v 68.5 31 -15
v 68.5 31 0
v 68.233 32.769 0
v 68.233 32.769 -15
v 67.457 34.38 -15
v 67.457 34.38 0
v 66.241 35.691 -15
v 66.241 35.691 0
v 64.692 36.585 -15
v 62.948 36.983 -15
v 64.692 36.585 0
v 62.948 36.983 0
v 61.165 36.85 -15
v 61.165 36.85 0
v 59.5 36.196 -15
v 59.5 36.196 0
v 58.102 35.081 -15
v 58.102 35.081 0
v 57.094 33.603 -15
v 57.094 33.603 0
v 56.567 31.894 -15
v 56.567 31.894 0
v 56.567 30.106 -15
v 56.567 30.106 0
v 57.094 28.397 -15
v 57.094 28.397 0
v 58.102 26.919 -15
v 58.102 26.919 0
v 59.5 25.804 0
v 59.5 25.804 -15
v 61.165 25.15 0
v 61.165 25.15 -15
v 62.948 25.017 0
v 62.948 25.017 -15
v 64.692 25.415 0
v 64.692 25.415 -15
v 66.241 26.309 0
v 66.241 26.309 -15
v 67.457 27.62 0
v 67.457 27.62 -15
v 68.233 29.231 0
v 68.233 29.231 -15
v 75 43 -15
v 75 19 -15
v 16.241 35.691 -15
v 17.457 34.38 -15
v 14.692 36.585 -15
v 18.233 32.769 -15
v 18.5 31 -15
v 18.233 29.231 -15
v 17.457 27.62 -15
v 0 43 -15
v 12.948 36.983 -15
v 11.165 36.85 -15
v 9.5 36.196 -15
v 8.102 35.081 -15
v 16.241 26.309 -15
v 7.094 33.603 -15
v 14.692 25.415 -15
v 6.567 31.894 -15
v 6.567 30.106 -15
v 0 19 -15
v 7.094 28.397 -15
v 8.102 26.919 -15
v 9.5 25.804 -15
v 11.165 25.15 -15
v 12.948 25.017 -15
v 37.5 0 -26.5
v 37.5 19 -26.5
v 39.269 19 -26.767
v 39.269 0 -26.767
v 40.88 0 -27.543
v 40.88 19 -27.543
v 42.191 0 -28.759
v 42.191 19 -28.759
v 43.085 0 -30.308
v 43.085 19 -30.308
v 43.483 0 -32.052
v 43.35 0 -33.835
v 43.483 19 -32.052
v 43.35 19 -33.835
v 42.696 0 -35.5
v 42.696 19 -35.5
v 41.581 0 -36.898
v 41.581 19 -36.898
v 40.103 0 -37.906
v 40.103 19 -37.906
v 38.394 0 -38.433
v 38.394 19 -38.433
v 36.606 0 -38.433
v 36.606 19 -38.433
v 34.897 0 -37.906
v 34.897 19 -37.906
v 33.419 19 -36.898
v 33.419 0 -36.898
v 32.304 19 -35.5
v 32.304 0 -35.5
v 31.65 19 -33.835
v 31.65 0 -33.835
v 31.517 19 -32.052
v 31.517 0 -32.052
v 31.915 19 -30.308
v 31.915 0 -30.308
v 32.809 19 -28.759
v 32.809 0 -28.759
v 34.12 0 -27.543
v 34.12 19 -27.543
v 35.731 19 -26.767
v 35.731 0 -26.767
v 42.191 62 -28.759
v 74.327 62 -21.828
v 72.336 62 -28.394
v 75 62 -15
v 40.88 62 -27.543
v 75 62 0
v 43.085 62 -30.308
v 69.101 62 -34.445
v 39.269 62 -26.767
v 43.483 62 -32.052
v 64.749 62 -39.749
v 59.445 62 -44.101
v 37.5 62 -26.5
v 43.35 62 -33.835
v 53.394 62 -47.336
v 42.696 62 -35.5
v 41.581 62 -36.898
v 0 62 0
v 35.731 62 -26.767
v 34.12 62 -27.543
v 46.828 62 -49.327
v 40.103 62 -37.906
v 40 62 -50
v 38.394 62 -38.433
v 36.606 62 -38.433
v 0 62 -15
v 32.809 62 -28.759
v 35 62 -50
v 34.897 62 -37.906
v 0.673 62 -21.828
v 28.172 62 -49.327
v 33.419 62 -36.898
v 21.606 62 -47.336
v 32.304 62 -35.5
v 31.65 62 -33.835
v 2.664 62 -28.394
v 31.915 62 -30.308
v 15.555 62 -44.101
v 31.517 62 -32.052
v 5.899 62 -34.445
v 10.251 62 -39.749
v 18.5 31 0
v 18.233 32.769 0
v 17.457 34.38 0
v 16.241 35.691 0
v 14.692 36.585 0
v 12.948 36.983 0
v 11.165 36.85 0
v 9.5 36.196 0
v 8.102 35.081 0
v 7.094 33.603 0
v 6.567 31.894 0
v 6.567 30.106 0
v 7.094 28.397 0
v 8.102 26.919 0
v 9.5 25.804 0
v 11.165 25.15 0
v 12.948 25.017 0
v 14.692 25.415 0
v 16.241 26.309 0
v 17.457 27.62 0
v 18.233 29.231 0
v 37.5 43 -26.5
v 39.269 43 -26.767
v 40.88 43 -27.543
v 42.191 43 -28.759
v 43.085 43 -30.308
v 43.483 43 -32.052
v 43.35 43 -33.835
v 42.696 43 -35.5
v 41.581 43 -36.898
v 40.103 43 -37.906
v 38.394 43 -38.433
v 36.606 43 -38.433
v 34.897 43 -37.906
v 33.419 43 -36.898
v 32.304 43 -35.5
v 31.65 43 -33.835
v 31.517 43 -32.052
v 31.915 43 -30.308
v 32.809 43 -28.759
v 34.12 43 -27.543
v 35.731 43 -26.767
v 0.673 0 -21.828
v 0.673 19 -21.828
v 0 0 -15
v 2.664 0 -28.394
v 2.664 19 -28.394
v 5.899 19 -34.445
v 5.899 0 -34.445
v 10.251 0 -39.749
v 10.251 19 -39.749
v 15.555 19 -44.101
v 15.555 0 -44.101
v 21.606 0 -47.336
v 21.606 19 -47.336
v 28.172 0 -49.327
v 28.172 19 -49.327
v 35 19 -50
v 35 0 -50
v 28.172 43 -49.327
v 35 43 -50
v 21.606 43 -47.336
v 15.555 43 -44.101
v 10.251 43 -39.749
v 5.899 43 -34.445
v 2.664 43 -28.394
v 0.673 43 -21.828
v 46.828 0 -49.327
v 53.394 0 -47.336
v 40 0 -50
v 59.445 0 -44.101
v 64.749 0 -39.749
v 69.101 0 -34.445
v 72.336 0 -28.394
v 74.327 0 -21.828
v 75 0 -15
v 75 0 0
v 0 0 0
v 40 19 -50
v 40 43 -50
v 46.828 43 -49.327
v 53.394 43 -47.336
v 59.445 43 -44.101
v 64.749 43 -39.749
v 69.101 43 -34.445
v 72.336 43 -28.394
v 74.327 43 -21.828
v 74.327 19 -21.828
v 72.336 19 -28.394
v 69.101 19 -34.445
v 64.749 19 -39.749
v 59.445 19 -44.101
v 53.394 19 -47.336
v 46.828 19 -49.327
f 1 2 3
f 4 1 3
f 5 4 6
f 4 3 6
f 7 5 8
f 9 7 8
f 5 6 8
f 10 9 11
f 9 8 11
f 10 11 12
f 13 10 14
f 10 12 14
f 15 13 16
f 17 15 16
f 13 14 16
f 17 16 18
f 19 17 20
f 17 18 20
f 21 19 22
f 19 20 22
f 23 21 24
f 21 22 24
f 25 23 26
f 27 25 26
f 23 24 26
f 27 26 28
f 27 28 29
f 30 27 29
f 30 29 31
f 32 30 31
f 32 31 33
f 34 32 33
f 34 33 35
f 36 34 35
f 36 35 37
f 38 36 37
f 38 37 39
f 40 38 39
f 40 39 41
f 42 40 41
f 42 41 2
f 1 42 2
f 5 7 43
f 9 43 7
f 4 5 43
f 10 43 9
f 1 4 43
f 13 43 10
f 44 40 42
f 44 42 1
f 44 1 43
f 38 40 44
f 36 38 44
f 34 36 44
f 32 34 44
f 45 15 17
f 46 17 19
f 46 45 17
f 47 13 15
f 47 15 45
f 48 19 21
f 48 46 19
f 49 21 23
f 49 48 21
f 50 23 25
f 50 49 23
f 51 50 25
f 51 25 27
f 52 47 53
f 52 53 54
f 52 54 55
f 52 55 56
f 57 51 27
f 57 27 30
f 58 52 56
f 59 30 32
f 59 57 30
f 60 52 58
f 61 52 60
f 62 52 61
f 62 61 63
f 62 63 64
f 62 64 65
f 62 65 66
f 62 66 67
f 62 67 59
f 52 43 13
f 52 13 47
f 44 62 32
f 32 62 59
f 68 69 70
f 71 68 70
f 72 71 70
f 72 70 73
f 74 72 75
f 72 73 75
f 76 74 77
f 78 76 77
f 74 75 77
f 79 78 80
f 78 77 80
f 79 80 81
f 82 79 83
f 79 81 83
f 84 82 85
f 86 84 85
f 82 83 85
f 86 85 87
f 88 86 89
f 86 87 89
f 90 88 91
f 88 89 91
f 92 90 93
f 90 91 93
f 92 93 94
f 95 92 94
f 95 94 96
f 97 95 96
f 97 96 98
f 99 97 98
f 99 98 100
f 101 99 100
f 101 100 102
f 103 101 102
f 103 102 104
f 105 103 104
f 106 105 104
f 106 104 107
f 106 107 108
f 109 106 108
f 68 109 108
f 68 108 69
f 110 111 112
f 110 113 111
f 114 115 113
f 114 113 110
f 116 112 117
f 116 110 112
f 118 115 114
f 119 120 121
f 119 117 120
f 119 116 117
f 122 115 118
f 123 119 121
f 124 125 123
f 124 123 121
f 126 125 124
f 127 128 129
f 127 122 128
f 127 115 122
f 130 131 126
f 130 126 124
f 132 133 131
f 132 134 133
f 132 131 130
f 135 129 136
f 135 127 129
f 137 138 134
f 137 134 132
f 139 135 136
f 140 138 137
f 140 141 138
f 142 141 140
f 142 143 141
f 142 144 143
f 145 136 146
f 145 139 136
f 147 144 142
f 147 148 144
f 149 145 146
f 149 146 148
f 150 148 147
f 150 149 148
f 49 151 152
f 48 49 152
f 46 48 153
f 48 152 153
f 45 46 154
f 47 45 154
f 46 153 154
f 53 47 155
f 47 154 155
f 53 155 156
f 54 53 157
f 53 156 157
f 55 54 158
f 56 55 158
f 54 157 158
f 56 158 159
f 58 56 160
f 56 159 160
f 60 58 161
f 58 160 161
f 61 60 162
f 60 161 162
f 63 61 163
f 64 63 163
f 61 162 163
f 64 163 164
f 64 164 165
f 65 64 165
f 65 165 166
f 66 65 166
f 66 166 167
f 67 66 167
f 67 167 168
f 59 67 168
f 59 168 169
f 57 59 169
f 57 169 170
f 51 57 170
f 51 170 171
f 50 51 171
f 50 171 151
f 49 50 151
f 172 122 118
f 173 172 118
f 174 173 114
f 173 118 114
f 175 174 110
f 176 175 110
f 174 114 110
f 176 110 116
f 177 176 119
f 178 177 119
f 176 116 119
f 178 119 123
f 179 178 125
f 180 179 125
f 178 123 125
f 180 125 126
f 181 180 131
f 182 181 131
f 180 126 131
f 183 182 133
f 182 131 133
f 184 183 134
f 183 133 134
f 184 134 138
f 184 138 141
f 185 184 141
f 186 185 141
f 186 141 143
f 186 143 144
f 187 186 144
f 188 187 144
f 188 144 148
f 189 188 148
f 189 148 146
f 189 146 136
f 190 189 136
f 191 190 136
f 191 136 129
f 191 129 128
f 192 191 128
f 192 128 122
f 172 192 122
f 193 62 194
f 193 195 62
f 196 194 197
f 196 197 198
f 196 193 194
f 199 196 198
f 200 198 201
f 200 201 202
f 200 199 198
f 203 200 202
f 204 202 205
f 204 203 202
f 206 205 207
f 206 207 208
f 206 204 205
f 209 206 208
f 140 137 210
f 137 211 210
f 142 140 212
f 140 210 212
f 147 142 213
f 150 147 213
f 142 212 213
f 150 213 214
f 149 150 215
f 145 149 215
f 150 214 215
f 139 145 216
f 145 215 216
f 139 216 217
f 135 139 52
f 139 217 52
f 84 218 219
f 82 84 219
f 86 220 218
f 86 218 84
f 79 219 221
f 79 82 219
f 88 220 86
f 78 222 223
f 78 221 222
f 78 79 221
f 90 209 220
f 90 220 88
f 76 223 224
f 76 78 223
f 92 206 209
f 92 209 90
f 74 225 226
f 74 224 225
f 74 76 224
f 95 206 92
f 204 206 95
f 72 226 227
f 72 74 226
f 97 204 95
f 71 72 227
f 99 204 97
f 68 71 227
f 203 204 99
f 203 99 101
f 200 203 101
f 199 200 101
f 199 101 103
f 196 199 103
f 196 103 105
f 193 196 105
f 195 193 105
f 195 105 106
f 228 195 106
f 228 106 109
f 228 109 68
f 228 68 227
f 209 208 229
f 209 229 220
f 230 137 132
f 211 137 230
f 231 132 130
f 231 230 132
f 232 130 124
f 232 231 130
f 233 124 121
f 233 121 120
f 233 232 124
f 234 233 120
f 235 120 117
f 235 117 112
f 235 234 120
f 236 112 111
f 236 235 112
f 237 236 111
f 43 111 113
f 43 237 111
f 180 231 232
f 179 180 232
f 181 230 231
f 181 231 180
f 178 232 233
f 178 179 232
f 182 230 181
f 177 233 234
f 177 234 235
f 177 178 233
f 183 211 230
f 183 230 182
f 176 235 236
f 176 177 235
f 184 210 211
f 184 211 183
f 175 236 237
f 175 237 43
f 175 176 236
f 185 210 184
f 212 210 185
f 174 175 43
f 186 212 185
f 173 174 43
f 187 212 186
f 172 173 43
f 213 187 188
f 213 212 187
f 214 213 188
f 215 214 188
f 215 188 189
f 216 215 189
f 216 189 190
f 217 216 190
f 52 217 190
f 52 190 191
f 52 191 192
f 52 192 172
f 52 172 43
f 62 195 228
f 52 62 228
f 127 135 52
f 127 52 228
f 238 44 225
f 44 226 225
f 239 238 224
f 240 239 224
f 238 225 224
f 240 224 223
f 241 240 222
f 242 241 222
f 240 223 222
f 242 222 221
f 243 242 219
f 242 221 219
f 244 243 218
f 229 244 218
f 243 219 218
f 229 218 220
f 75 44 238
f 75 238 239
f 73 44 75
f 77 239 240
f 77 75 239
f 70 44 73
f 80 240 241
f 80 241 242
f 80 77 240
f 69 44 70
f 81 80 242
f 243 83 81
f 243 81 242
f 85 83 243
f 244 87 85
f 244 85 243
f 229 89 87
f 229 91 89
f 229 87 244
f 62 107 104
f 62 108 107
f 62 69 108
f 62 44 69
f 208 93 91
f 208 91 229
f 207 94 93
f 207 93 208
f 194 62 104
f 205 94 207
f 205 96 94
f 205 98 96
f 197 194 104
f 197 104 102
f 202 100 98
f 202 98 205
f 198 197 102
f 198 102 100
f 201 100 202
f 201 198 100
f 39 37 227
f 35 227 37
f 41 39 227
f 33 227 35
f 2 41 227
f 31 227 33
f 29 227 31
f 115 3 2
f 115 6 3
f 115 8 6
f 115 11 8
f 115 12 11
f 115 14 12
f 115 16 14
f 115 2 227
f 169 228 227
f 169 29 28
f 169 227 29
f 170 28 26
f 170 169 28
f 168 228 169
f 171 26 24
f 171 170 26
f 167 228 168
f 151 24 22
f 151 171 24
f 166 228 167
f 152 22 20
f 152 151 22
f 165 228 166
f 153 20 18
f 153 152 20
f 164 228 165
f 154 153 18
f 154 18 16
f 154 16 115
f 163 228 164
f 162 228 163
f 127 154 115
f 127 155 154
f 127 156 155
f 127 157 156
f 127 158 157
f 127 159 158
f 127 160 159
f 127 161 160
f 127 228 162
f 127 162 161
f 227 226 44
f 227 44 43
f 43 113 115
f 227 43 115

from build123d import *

# Parameters (mm, degrees)
BOSS_EXTRUDE1_DEPTH = 75
SKETCH2_R           = 6
CUT_EXTRUDE1_DEPTH  = 110.402925007
SKETCH3_R           = 6
CUT_EXTRUDE2_DEPTH  = 110.402925007
FILLET1_R           = 35


with BuildPart() as part:
    # Sketch1 → Boss-Extrude1 (new body)
    with BuildSketch(Plane(origin=(0, 0, 0), x_dir=(0, 0, -1), z_dir=(1, 0, 0))):
        Polygon((50, 62), (50, 43), (15, 43), (15, 19), (50, 19), (50, 0), (0, 0), (0, 62), align=None)
    extrude(amount=BOSS_EXTRUDE1_DEPTH)

    # Sketch2 → Cut-Extrude1 (cut, through all)
    with BuildSketch(Plane.XY):
        with Locations((62.5, 31)):
            Circle(SKETCH2_R)
        with Locations((12.5, 31)):
            Circle(SKETCH2_R)
    extrude(amount=-CUT_EXTRUDE1_DEPTH, mode=Mode.SUBTRACT)

    # Sketch3 → Cut-Extrude2 (cut, through all)
    with BuildSketch(Plane(origin=(0, 62, 0), x_dir=(1, 0, 0), z_dir=(0, 1, 0))):
        with Locations(Location((37.5, 32.5, 0), (0, 0, 270))):
            Circle(SKETCH3_R)
    extrude(amount=-CUT_EXTRUDE2_DEPTH, mode=Mode.SUBTRACT)

    # Fillet1
    fillet1_edges = [part.edges().sort_by_distance(p)[0] for p in [
        (75, 9.5, -50),
        (0, 9.5, -50),
        (0, 52.5, -50),
        (75, 52.5, -50),
    ]]
    fillet(fillet1_edges, radius=FILLET1_R)


solid = part.part
